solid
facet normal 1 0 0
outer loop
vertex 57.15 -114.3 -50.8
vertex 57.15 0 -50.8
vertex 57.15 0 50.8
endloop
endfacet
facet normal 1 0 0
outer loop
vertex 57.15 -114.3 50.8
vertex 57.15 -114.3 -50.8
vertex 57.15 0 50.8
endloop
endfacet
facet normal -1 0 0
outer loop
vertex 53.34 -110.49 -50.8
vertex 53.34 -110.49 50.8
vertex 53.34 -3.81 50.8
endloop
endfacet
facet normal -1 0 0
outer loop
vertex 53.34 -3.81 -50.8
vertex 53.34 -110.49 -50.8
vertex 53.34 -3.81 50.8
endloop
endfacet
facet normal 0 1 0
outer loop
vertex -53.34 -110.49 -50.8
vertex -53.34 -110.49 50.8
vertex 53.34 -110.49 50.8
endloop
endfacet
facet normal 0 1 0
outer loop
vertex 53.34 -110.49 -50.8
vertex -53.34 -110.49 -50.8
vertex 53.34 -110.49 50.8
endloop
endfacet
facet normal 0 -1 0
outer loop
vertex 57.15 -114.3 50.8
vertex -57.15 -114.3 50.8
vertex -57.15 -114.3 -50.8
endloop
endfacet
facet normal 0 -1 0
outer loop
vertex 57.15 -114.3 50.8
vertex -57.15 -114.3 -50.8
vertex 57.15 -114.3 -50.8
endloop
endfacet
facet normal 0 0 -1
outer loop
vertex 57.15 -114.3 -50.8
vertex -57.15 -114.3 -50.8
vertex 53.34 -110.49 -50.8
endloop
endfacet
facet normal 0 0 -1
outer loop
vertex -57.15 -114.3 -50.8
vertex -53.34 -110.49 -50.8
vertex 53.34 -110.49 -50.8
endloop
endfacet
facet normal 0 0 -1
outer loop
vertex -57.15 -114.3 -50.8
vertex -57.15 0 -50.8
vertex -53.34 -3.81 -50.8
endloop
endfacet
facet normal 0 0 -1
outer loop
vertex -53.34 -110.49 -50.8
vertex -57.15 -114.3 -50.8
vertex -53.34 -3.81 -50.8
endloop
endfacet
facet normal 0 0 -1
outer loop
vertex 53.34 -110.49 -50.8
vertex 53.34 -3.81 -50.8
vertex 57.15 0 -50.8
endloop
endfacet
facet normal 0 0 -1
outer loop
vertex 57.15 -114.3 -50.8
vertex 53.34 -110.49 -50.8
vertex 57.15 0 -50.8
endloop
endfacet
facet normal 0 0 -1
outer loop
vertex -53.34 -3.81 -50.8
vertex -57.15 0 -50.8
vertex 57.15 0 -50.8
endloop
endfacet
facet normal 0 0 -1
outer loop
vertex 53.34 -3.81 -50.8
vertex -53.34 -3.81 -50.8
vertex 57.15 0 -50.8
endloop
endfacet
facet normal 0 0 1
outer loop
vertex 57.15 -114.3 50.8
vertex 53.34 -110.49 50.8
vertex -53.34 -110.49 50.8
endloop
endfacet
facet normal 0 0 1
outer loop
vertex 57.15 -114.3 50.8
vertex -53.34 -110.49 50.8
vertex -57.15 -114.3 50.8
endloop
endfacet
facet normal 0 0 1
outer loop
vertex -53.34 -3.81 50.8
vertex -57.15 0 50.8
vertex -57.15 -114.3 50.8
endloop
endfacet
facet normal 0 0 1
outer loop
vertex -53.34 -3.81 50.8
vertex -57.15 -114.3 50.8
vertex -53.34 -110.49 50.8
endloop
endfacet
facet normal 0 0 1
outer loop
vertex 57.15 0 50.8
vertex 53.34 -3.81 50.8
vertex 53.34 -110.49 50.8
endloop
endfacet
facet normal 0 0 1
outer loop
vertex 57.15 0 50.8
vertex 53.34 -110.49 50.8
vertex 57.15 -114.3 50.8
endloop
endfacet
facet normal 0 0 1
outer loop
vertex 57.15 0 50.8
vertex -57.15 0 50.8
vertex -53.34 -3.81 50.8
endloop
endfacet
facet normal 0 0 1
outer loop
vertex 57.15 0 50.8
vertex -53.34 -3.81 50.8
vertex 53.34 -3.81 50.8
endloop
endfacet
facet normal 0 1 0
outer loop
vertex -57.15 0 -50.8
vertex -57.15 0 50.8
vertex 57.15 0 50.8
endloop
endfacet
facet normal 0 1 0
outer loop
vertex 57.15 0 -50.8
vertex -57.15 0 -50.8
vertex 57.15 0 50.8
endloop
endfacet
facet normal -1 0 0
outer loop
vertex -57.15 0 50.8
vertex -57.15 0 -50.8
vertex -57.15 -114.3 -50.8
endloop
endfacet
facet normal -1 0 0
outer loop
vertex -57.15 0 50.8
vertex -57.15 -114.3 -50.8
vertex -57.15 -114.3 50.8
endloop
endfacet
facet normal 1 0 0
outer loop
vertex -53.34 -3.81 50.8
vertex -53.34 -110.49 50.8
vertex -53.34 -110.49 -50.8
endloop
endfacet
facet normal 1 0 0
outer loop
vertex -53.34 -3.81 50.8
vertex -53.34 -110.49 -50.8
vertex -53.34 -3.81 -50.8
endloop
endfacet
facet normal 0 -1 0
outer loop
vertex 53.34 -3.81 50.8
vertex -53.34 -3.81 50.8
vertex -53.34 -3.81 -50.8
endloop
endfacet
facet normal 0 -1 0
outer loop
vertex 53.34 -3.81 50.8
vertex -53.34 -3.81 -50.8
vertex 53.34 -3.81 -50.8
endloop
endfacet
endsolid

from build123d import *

# Parameters (mm, degrees)
F0_W     = 114.3
F0_H     = 101.6
F1_DEPTH = 114.3
F2_W     = 106.68
F2_H     = 106.68
F3_DEPTH = 50.801
F4_DEPTH = 50.801


with BuildPart() as f1:
    # F0 (on Front) → F1 (new body)
    with BuildSketch(Plane.XZ):
        Rectangle(F0_W, F0_H)
    extrude(amount=F1_DEPTH)

    # F2 (on Top) → F3 (cut, through all)
    with BuildSketch(Plane.XY):
        with Locations((0, -57.15)):
            Rectangle(F2_W, F2_H)
    extrude(amount=F3_DEPTH, mode=Mode.SUBTRACT)

    # F2 (on Top) → F4 (cut, through all)
    with BuildSketch(Plane.XY):
        with Locations((0, -57.15)):
            Rectangle(F2_W, F2_H)
    extrude(amount=-F4_DEPTH, mode=Mode.SUBTRACT)


solid = f1.part
